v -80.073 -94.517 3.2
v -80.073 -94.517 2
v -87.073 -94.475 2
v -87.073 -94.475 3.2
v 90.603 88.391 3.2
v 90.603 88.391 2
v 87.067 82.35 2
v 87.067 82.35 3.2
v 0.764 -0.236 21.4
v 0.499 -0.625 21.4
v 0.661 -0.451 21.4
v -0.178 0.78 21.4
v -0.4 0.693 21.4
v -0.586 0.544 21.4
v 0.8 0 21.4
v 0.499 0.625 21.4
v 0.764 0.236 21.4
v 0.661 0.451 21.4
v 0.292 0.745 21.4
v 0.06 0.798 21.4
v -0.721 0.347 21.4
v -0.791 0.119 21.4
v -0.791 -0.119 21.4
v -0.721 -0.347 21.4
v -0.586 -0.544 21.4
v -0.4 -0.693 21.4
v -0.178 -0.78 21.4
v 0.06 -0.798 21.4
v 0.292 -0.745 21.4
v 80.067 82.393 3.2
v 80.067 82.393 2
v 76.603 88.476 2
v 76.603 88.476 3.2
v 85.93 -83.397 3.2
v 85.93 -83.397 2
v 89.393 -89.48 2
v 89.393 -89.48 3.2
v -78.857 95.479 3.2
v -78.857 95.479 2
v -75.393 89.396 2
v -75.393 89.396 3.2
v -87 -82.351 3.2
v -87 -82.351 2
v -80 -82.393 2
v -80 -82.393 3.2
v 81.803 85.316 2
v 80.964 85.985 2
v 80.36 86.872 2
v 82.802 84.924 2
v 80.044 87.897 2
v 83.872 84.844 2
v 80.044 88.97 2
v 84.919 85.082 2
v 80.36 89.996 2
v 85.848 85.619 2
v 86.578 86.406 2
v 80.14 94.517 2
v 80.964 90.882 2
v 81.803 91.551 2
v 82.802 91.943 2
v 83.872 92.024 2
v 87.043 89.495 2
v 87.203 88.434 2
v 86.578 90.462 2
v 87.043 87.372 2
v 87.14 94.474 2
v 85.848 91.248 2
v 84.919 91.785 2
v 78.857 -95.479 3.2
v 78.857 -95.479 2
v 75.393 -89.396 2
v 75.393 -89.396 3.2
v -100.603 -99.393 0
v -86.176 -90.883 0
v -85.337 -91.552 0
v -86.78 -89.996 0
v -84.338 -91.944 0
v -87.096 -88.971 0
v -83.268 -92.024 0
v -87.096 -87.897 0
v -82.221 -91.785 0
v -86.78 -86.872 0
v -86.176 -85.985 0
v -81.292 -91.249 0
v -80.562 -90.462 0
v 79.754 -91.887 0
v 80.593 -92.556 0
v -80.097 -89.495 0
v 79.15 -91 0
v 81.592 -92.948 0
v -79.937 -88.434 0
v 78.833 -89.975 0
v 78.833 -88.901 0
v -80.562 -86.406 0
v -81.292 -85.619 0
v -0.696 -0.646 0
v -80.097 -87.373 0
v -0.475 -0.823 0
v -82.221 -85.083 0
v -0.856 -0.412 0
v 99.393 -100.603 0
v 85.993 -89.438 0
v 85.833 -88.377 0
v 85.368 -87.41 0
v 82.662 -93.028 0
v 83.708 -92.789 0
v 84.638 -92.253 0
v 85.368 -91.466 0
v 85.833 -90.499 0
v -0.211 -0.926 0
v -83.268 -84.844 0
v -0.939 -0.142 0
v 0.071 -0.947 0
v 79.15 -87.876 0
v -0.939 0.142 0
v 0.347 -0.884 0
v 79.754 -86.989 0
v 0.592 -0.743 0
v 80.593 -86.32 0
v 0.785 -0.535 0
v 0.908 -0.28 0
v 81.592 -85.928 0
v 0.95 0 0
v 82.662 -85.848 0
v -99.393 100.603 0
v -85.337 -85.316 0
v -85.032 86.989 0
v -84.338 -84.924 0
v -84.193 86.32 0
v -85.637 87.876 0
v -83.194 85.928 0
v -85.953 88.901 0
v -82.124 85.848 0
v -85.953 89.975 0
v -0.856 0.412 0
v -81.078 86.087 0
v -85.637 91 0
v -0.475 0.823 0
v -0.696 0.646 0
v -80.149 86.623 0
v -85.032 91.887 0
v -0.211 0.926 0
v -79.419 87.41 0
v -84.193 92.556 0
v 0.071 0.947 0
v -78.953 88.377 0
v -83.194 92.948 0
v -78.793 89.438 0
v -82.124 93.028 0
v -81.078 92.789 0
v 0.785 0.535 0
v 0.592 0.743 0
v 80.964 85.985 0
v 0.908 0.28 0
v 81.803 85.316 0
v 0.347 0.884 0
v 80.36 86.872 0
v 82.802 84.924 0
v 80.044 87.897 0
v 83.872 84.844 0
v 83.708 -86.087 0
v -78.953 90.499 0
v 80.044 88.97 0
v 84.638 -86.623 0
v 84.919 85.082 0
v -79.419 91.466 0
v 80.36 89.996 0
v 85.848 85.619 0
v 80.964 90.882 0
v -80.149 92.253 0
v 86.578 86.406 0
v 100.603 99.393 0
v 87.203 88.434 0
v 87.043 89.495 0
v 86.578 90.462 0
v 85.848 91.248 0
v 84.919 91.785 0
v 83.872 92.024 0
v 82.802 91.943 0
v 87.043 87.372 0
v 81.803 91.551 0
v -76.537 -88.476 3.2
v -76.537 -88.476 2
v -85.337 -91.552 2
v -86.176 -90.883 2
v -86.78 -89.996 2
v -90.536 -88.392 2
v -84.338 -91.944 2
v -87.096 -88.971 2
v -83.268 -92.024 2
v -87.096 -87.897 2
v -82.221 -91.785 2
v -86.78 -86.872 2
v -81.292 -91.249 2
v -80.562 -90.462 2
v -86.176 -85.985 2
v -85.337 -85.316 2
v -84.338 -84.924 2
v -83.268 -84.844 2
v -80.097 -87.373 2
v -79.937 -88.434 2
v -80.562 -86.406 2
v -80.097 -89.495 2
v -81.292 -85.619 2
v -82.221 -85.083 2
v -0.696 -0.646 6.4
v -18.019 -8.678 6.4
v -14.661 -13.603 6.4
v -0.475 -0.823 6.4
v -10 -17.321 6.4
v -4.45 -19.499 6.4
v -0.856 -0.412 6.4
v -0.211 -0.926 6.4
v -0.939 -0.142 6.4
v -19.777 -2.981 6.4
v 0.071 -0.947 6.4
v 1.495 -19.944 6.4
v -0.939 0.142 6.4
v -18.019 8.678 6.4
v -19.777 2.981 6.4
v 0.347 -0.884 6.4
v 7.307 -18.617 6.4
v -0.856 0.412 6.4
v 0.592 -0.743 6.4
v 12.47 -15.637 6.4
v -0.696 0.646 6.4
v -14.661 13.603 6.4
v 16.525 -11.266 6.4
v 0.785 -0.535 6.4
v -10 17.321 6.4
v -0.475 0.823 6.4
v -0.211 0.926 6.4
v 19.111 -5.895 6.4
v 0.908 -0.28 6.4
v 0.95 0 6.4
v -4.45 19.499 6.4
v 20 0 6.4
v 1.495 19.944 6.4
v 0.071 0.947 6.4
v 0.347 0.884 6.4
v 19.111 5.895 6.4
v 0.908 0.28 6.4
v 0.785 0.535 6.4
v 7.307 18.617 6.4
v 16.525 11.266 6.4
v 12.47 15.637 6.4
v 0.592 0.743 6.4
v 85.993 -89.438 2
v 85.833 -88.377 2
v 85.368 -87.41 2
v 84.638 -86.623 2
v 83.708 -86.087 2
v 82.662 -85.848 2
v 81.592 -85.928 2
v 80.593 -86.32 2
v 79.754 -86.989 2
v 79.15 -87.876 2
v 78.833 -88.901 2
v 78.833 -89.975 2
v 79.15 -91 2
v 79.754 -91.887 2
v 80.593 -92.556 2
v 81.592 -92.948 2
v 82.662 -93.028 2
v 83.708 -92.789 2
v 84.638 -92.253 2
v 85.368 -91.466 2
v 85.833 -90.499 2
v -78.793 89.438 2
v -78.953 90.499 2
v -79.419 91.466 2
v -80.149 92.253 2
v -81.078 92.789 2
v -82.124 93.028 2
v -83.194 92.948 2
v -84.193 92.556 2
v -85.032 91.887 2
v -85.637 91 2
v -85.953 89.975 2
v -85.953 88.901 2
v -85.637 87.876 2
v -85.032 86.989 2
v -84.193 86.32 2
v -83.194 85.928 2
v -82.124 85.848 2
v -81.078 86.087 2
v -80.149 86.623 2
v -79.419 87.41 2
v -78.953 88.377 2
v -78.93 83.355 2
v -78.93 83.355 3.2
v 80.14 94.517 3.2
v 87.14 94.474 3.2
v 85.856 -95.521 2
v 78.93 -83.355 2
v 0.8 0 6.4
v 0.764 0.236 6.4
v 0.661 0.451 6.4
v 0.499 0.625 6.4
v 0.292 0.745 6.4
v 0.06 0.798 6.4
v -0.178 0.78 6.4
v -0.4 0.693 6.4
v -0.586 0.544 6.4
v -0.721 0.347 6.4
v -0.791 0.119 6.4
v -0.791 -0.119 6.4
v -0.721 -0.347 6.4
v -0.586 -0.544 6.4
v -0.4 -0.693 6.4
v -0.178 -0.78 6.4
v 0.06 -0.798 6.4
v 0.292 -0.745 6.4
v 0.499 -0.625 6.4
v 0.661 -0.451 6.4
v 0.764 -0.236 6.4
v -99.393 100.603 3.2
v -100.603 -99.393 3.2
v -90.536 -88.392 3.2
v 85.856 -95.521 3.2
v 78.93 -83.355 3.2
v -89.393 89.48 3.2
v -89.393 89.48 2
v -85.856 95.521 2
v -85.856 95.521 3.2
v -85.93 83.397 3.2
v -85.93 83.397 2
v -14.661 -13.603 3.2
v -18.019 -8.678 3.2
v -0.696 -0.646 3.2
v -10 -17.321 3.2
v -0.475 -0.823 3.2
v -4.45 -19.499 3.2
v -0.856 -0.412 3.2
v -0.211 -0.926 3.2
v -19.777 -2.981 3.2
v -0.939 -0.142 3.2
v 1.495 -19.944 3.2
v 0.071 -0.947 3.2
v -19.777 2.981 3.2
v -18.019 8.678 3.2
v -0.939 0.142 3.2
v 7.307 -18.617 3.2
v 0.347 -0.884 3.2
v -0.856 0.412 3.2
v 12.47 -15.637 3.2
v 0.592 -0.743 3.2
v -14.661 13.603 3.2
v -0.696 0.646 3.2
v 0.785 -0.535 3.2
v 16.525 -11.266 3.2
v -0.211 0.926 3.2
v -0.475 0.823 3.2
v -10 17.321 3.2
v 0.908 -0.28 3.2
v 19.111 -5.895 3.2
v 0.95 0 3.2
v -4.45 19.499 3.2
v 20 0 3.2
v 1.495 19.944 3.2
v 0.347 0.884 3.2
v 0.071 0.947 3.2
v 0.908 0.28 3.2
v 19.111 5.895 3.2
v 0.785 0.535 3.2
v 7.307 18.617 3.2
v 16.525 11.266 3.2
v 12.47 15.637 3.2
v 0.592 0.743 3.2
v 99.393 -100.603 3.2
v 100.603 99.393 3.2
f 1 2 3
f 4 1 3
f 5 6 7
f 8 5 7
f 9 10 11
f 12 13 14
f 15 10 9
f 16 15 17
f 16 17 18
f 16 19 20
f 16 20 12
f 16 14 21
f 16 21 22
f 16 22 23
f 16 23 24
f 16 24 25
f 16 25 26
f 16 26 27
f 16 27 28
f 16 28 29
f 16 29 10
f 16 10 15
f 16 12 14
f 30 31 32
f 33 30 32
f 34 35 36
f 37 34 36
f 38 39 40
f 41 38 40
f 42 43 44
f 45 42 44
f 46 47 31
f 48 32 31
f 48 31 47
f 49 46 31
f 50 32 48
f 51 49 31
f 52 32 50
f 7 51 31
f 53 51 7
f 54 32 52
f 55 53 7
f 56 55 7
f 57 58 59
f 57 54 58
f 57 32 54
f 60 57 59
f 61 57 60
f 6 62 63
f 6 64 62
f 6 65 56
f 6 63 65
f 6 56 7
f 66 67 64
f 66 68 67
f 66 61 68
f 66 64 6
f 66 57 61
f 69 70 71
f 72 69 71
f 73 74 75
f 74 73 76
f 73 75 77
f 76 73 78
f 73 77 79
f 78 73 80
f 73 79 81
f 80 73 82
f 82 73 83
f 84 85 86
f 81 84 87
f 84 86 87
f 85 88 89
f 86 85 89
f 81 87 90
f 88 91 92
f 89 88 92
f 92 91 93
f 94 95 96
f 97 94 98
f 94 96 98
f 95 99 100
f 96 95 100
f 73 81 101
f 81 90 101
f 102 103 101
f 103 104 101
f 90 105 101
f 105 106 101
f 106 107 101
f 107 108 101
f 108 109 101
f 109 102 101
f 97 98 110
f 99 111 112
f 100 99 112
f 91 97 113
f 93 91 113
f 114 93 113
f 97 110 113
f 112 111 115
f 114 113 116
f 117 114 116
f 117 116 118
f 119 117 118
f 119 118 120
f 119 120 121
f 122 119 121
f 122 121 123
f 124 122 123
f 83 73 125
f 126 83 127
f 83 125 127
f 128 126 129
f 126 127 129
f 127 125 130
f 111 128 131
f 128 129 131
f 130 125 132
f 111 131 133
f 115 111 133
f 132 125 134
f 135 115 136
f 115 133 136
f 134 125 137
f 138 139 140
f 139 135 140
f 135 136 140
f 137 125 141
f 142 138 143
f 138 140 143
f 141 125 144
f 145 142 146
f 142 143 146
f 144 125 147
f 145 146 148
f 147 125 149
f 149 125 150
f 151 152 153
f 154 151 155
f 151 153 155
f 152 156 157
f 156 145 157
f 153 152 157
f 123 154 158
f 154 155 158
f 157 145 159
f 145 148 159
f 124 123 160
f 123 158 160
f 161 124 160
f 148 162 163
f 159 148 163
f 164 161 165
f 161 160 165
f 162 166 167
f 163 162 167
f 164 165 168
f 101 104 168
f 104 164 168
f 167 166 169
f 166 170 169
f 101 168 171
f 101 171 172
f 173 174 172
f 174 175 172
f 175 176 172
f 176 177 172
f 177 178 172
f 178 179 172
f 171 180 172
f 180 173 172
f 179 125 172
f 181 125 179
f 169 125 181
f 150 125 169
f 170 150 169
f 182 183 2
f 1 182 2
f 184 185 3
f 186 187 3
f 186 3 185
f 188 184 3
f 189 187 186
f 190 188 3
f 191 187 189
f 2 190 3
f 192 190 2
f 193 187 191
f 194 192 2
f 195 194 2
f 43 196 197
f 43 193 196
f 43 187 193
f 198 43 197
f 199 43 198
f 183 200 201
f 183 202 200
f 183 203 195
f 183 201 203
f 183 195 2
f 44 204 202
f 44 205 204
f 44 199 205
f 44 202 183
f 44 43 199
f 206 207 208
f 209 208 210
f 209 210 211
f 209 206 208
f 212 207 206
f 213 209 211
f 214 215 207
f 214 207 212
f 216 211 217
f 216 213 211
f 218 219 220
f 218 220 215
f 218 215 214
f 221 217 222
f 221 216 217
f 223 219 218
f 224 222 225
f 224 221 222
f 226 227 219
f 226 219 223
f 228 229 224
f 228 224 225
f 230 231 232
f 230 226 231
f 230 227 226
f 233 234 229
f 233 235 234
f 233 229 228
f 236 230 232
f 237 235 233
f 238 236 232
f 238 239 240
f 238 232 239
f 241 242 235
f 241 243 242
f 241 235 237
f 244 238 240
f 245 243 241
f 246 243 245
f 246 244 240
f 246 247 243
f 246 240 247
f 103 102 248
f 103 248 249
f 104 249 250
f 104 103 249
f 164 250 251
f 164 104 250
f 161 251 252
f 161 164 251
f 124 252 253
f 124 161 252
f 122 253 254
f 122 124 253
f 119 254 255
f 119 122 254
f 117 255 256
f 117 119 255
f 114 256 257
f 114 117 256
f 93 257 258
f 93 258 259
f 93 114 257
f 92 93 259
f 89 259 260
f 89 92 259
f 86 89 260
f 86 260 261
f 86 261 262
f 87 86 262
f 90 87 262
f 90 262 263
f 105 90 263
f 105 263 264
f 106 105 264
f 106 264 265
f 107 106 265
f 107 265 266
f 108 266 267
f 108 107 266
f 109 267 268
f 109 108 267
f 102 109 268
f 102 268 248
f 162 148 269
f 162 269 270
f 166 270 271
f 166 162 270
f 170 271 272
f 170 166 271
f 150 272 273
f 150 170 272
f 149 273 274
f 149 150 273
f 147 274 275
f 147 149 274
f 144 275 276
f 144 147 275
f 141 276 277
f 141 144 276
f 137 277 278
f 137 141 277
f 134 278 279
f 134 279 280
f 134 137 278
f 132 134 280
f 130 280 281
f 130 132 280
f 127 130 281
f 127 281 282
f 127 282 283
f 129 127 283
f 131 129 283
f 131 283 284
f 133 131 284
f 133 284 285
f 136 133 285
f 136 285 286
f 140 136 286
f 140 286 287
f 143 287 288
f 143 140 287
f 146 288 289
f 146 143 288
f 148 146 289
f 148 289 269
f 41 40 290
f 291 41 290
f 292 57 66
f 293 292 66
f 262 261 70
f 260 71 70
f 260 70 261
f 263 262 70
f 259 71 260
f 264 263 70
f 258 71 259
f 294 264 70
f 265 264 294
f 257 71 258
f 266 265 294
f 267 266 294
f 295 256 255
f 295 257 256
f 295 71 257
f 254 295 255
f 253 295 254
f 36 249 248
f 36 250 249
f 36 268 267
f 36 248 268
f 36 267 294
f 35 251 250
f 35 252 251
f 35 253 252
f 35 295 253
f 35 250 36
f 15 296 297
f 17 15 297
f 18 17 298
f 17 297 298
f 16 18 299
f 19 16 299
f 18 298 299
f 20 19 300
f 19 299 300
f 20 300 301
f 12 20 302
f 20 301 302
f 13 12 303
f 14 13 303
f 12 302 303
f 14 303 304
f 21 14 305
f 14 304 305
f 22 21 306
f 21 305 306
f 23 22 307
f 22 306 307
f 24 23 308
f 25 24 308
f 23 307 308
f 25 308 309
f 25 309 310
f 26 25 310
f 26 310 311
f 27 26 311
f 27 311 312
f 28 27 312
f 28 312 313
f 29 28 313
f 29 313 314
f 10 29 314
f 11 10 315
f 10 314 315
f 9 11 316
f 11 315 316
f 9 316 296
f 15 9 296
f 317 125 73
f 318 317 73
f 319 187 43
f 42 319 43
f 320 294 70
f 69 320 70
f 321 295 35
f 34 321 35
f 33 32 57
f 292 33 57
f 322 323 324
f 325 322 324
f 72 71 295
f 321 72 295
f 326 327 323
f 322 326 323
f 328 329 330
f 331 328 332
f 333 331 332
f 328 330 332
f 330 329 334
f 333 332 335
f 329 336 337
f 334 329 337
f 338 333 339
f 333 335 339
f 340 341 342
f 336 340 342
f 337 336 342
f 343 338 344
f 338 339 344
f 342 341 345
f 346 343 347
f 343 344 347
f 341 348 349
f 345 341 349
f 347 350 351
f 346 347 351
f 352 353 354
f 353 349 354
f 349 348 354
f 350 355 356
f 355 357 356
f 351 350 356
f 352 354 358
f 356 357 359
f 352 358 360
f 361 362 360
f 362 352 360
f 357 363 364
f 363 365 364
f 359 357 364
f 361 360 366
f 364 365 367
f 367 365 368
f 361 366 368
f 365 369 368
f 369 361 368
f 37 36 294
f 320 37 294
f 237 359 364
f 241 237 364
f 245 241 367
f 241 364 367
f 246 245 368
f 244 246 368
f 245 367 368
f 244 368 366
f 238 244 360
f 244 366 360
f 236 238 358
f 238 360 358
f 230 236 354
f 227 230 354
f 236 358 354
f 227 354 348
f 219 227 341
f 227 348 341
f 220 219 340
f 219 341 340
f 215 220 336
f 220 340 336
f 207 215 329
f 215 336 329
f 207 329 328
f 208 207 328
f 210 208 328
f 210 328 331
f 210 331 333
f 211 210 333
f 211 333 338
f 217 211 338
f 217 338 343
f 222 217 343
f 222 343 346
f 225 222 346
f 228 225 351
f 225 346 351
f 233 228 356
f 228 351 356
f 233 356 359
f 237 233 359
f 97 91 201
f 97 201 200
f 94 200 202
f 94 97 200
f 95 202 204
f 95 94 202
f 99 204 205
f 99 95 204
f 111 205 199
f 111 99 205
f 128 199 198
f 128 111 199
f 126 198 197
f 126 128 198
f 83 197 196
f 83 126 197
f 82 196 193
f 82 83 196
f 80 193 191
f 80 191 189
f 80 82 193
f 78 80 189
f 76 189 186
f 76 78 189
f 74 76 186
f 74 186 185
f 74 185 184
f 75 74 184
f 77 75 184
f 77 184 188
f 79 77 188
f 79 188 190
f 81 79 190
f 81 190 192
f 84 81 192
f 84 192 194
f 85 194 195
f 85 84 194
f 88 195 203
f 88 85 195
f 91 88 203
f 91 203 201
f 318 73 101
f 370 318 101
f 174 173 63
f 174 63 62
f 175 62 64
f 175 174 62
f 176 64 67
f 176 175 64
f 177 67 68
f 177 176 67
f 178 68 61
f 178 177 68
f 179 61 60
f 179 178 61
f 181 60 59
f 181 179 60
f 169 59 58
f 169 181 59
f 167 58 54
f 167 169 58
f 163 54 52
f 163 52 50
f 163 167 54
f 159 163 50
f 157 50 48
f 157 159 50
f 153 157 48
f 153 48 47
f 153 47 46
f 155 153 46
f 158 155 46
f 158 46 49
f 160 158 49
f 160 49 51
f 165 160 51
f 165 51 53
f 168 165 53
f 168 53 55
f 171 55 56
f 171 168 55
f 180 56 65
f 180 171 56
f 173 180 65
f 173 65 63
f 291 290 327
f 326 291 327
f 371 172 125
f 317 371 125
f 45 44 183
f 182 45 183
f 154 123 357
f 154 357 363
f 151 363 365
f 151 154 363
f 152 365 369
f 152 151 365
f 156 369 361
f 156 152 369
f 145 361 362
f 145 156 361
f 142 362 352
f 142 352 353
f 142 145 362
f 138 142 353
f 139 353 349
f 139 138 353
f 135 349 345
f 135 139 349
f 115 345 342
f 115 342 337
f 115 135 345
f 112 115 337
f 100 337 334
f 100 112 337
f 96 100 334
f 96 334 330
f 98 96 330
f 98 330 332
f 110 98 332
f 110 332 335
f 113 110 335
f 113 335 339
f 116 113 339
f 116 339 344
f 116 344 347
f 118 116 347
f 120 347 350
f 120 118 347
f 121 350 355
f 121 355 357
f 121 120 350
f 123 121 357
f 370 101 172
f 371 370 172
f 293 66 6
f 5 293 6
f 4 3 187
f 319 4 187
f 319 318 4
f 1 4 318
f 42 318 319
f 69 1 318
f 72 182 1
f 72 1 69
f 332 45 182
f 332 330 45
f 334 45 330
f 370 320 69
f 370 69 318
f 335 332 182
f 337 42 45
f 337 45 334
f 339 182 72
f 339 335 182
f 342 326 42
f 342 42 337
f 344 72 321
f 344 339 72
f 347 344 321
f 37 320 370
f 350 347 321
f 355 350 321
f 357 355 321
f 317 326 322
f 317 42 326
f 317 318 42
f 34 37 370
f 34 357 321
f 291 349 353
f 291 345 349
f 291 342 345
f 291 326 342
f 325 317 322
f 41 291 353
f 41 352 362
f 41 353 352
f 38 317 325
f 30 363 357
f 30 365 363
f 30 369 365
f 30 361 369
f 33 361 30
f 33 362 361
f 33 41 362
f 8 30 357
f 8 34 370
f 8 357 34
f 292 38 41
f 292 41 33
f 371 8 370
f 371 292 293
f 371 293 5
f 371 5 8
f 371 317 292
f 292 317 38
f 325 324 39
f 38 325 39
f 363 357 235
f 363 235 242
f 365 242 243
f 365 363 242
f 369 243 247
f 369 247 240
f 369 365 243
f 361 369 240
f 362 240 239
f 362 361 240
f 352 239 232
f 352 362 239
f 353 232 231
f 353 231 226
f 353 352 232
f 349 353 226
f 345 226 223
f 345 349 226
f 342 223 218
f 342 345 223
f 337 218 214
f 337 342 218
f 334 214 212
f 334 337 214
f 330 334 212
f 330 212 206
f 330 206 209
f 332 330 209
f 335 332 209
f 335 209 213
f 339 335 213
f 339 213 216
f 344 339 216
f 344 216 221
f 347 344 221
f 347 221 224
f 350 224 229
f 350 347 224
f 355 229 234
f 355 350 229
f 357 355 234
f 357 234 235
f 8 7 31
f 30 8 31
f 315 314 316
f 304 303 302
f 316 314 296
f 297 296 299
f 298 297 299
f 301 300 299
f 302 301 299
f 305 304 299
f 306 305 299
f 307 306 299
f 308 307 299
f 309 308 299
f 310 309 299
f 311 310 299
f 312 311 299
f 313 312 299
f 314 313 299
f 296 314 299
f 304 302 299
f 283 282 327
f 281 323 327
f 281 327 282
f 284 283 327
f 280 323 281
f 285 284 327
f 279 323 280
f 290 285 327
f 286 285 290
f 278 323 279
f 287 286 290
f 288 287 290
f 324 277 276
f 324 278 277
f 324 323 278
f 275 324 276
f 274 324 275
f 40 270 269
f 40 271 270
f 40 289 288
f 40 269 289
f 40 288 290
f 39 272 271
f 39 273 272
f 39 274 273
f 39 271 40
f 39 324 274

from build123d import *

# Parameters (mm, degrees)
F0_R     = 0.95
F1_DEPTH = 3.2
F0_R_2   = 3.6
F2_DEPTH = 2
F3_R     = 20
F3_R_2   = 0.95
F4_DEPTH = 3.2
F5_R     = 0.8
F6_DEPTH = 15


with BuildPart() as f1:
    # F0 (on Top) → F1 (new body)
    with BuildSketch(Plane.XY):
        Polygon((100.603239, 99.3931), (-99.3931, 100.603239), (-100.603239, -99.3931), (99.3931, -100.603239), align=None)
        Polygon((-87.073233, -94.474876), (-90.536488, -88.391632), (-86.999872, -82.350742), (-80, -82.393097), (-76.536744, -88.476341), (-80.073361, -94.517231), align=None, mode=Mode.SUBTRACT)
        Circle(F0_R, mode=Mode.SUBTRACT)
        Polygon((85.929844, -83.397106), (89.3931, -89.480351), (85.856484, -95.52124), (78.856612, -95.478885), (75.393356, -89.395641), (78.929972, -83.354751), align=None, mode=Mode.SUBTRACT)
        Polygon((-78.856612, 95.478885), (-75.393356, 89.395641), (-78.929972, 83.354751), (-85.929844, 83.397106), (-89.3931, 89.480351), (-85.856484, 95.52124), align=None, mode=Mode.SUBTRACT)
        Polygon((87.139983, 94.474472), (90.603239, 88.391228), (87.066623, 82.350338), (80.066751, 82.392693), (76.603495, 88.475937), (80.140112, 94.516827), align=None, mode=Mode.SUBTRACT)
    extrude(amount=F1_DEPTH)

    # F0 (on Top) → F2 (join)
    with BuildSketch(Plane.XY):
        Polygon((-86.999872, -82.350742), (-90.536488, -88.391632), (-87.073233, -94.474876), (-80.073361, -94.517231), (-76.536744, -88.476341), (-80, -82.393097), align=None)
        with Locations((-83.536616, -88.433986)):
            Circle(F0_R_2, mode=Mode.SUBTRACT)
        Polygon((-78.929972, 83.354751), (-75.393356, 89.395641), (-78.856612, 95.478885), (-85.856484, 95.52124), (-89.3931, 89.480351), (-85.929844, 83.397106), align=None)
        with Locations((-82.393228, 89.437996)):
            Circle(F0_R_2, mode=Mode.SUBTRACT)
        Polygon((85.856484, -95.52124), (89.3931, -89.480351), (85.929844, -83.397106), (78.929972, -83.354751), (75.393356, -89.395641), (78.856612, -95.478885), align=None)
        with Locations((82.393228, -89.437996)):
            Circle(F0_R_2, mode=Mode.SUBTRACT)
        Polygon((87.066623, 82.350338), (90.603239, 88.391228), (87.139983, 94.474472), (80.140112, 94.516827), (76.603495, 88.475937), (80.066751, 82.392693), align=None)
        with Locations((83.603367, 88.433582)):
            Circle(F0_R_2, mode=Mode.SUBTRACT)
    extrude(amount=F2_DEPTH)


with BuildPart() as f4:
    # F3 (on face) → F4 (new body)
    with BuildSketch(Plane.XY.offset(3.2)):
        Circle(F3_R)
        Circle(F3_R_2, mode=Mode.SUBTRACT)
    extrude(amount=F4_DEPTH)


with BuildPart() as f6:
    # F5 (on face) → F6 (new body)
    with BuildSketch(Plane.XY.offset(6.4)):
        Circle(F5_R)
    extrude(amount=F6_DEPTH)


solid = Compound([f1.part, f4.part, f6.part])
